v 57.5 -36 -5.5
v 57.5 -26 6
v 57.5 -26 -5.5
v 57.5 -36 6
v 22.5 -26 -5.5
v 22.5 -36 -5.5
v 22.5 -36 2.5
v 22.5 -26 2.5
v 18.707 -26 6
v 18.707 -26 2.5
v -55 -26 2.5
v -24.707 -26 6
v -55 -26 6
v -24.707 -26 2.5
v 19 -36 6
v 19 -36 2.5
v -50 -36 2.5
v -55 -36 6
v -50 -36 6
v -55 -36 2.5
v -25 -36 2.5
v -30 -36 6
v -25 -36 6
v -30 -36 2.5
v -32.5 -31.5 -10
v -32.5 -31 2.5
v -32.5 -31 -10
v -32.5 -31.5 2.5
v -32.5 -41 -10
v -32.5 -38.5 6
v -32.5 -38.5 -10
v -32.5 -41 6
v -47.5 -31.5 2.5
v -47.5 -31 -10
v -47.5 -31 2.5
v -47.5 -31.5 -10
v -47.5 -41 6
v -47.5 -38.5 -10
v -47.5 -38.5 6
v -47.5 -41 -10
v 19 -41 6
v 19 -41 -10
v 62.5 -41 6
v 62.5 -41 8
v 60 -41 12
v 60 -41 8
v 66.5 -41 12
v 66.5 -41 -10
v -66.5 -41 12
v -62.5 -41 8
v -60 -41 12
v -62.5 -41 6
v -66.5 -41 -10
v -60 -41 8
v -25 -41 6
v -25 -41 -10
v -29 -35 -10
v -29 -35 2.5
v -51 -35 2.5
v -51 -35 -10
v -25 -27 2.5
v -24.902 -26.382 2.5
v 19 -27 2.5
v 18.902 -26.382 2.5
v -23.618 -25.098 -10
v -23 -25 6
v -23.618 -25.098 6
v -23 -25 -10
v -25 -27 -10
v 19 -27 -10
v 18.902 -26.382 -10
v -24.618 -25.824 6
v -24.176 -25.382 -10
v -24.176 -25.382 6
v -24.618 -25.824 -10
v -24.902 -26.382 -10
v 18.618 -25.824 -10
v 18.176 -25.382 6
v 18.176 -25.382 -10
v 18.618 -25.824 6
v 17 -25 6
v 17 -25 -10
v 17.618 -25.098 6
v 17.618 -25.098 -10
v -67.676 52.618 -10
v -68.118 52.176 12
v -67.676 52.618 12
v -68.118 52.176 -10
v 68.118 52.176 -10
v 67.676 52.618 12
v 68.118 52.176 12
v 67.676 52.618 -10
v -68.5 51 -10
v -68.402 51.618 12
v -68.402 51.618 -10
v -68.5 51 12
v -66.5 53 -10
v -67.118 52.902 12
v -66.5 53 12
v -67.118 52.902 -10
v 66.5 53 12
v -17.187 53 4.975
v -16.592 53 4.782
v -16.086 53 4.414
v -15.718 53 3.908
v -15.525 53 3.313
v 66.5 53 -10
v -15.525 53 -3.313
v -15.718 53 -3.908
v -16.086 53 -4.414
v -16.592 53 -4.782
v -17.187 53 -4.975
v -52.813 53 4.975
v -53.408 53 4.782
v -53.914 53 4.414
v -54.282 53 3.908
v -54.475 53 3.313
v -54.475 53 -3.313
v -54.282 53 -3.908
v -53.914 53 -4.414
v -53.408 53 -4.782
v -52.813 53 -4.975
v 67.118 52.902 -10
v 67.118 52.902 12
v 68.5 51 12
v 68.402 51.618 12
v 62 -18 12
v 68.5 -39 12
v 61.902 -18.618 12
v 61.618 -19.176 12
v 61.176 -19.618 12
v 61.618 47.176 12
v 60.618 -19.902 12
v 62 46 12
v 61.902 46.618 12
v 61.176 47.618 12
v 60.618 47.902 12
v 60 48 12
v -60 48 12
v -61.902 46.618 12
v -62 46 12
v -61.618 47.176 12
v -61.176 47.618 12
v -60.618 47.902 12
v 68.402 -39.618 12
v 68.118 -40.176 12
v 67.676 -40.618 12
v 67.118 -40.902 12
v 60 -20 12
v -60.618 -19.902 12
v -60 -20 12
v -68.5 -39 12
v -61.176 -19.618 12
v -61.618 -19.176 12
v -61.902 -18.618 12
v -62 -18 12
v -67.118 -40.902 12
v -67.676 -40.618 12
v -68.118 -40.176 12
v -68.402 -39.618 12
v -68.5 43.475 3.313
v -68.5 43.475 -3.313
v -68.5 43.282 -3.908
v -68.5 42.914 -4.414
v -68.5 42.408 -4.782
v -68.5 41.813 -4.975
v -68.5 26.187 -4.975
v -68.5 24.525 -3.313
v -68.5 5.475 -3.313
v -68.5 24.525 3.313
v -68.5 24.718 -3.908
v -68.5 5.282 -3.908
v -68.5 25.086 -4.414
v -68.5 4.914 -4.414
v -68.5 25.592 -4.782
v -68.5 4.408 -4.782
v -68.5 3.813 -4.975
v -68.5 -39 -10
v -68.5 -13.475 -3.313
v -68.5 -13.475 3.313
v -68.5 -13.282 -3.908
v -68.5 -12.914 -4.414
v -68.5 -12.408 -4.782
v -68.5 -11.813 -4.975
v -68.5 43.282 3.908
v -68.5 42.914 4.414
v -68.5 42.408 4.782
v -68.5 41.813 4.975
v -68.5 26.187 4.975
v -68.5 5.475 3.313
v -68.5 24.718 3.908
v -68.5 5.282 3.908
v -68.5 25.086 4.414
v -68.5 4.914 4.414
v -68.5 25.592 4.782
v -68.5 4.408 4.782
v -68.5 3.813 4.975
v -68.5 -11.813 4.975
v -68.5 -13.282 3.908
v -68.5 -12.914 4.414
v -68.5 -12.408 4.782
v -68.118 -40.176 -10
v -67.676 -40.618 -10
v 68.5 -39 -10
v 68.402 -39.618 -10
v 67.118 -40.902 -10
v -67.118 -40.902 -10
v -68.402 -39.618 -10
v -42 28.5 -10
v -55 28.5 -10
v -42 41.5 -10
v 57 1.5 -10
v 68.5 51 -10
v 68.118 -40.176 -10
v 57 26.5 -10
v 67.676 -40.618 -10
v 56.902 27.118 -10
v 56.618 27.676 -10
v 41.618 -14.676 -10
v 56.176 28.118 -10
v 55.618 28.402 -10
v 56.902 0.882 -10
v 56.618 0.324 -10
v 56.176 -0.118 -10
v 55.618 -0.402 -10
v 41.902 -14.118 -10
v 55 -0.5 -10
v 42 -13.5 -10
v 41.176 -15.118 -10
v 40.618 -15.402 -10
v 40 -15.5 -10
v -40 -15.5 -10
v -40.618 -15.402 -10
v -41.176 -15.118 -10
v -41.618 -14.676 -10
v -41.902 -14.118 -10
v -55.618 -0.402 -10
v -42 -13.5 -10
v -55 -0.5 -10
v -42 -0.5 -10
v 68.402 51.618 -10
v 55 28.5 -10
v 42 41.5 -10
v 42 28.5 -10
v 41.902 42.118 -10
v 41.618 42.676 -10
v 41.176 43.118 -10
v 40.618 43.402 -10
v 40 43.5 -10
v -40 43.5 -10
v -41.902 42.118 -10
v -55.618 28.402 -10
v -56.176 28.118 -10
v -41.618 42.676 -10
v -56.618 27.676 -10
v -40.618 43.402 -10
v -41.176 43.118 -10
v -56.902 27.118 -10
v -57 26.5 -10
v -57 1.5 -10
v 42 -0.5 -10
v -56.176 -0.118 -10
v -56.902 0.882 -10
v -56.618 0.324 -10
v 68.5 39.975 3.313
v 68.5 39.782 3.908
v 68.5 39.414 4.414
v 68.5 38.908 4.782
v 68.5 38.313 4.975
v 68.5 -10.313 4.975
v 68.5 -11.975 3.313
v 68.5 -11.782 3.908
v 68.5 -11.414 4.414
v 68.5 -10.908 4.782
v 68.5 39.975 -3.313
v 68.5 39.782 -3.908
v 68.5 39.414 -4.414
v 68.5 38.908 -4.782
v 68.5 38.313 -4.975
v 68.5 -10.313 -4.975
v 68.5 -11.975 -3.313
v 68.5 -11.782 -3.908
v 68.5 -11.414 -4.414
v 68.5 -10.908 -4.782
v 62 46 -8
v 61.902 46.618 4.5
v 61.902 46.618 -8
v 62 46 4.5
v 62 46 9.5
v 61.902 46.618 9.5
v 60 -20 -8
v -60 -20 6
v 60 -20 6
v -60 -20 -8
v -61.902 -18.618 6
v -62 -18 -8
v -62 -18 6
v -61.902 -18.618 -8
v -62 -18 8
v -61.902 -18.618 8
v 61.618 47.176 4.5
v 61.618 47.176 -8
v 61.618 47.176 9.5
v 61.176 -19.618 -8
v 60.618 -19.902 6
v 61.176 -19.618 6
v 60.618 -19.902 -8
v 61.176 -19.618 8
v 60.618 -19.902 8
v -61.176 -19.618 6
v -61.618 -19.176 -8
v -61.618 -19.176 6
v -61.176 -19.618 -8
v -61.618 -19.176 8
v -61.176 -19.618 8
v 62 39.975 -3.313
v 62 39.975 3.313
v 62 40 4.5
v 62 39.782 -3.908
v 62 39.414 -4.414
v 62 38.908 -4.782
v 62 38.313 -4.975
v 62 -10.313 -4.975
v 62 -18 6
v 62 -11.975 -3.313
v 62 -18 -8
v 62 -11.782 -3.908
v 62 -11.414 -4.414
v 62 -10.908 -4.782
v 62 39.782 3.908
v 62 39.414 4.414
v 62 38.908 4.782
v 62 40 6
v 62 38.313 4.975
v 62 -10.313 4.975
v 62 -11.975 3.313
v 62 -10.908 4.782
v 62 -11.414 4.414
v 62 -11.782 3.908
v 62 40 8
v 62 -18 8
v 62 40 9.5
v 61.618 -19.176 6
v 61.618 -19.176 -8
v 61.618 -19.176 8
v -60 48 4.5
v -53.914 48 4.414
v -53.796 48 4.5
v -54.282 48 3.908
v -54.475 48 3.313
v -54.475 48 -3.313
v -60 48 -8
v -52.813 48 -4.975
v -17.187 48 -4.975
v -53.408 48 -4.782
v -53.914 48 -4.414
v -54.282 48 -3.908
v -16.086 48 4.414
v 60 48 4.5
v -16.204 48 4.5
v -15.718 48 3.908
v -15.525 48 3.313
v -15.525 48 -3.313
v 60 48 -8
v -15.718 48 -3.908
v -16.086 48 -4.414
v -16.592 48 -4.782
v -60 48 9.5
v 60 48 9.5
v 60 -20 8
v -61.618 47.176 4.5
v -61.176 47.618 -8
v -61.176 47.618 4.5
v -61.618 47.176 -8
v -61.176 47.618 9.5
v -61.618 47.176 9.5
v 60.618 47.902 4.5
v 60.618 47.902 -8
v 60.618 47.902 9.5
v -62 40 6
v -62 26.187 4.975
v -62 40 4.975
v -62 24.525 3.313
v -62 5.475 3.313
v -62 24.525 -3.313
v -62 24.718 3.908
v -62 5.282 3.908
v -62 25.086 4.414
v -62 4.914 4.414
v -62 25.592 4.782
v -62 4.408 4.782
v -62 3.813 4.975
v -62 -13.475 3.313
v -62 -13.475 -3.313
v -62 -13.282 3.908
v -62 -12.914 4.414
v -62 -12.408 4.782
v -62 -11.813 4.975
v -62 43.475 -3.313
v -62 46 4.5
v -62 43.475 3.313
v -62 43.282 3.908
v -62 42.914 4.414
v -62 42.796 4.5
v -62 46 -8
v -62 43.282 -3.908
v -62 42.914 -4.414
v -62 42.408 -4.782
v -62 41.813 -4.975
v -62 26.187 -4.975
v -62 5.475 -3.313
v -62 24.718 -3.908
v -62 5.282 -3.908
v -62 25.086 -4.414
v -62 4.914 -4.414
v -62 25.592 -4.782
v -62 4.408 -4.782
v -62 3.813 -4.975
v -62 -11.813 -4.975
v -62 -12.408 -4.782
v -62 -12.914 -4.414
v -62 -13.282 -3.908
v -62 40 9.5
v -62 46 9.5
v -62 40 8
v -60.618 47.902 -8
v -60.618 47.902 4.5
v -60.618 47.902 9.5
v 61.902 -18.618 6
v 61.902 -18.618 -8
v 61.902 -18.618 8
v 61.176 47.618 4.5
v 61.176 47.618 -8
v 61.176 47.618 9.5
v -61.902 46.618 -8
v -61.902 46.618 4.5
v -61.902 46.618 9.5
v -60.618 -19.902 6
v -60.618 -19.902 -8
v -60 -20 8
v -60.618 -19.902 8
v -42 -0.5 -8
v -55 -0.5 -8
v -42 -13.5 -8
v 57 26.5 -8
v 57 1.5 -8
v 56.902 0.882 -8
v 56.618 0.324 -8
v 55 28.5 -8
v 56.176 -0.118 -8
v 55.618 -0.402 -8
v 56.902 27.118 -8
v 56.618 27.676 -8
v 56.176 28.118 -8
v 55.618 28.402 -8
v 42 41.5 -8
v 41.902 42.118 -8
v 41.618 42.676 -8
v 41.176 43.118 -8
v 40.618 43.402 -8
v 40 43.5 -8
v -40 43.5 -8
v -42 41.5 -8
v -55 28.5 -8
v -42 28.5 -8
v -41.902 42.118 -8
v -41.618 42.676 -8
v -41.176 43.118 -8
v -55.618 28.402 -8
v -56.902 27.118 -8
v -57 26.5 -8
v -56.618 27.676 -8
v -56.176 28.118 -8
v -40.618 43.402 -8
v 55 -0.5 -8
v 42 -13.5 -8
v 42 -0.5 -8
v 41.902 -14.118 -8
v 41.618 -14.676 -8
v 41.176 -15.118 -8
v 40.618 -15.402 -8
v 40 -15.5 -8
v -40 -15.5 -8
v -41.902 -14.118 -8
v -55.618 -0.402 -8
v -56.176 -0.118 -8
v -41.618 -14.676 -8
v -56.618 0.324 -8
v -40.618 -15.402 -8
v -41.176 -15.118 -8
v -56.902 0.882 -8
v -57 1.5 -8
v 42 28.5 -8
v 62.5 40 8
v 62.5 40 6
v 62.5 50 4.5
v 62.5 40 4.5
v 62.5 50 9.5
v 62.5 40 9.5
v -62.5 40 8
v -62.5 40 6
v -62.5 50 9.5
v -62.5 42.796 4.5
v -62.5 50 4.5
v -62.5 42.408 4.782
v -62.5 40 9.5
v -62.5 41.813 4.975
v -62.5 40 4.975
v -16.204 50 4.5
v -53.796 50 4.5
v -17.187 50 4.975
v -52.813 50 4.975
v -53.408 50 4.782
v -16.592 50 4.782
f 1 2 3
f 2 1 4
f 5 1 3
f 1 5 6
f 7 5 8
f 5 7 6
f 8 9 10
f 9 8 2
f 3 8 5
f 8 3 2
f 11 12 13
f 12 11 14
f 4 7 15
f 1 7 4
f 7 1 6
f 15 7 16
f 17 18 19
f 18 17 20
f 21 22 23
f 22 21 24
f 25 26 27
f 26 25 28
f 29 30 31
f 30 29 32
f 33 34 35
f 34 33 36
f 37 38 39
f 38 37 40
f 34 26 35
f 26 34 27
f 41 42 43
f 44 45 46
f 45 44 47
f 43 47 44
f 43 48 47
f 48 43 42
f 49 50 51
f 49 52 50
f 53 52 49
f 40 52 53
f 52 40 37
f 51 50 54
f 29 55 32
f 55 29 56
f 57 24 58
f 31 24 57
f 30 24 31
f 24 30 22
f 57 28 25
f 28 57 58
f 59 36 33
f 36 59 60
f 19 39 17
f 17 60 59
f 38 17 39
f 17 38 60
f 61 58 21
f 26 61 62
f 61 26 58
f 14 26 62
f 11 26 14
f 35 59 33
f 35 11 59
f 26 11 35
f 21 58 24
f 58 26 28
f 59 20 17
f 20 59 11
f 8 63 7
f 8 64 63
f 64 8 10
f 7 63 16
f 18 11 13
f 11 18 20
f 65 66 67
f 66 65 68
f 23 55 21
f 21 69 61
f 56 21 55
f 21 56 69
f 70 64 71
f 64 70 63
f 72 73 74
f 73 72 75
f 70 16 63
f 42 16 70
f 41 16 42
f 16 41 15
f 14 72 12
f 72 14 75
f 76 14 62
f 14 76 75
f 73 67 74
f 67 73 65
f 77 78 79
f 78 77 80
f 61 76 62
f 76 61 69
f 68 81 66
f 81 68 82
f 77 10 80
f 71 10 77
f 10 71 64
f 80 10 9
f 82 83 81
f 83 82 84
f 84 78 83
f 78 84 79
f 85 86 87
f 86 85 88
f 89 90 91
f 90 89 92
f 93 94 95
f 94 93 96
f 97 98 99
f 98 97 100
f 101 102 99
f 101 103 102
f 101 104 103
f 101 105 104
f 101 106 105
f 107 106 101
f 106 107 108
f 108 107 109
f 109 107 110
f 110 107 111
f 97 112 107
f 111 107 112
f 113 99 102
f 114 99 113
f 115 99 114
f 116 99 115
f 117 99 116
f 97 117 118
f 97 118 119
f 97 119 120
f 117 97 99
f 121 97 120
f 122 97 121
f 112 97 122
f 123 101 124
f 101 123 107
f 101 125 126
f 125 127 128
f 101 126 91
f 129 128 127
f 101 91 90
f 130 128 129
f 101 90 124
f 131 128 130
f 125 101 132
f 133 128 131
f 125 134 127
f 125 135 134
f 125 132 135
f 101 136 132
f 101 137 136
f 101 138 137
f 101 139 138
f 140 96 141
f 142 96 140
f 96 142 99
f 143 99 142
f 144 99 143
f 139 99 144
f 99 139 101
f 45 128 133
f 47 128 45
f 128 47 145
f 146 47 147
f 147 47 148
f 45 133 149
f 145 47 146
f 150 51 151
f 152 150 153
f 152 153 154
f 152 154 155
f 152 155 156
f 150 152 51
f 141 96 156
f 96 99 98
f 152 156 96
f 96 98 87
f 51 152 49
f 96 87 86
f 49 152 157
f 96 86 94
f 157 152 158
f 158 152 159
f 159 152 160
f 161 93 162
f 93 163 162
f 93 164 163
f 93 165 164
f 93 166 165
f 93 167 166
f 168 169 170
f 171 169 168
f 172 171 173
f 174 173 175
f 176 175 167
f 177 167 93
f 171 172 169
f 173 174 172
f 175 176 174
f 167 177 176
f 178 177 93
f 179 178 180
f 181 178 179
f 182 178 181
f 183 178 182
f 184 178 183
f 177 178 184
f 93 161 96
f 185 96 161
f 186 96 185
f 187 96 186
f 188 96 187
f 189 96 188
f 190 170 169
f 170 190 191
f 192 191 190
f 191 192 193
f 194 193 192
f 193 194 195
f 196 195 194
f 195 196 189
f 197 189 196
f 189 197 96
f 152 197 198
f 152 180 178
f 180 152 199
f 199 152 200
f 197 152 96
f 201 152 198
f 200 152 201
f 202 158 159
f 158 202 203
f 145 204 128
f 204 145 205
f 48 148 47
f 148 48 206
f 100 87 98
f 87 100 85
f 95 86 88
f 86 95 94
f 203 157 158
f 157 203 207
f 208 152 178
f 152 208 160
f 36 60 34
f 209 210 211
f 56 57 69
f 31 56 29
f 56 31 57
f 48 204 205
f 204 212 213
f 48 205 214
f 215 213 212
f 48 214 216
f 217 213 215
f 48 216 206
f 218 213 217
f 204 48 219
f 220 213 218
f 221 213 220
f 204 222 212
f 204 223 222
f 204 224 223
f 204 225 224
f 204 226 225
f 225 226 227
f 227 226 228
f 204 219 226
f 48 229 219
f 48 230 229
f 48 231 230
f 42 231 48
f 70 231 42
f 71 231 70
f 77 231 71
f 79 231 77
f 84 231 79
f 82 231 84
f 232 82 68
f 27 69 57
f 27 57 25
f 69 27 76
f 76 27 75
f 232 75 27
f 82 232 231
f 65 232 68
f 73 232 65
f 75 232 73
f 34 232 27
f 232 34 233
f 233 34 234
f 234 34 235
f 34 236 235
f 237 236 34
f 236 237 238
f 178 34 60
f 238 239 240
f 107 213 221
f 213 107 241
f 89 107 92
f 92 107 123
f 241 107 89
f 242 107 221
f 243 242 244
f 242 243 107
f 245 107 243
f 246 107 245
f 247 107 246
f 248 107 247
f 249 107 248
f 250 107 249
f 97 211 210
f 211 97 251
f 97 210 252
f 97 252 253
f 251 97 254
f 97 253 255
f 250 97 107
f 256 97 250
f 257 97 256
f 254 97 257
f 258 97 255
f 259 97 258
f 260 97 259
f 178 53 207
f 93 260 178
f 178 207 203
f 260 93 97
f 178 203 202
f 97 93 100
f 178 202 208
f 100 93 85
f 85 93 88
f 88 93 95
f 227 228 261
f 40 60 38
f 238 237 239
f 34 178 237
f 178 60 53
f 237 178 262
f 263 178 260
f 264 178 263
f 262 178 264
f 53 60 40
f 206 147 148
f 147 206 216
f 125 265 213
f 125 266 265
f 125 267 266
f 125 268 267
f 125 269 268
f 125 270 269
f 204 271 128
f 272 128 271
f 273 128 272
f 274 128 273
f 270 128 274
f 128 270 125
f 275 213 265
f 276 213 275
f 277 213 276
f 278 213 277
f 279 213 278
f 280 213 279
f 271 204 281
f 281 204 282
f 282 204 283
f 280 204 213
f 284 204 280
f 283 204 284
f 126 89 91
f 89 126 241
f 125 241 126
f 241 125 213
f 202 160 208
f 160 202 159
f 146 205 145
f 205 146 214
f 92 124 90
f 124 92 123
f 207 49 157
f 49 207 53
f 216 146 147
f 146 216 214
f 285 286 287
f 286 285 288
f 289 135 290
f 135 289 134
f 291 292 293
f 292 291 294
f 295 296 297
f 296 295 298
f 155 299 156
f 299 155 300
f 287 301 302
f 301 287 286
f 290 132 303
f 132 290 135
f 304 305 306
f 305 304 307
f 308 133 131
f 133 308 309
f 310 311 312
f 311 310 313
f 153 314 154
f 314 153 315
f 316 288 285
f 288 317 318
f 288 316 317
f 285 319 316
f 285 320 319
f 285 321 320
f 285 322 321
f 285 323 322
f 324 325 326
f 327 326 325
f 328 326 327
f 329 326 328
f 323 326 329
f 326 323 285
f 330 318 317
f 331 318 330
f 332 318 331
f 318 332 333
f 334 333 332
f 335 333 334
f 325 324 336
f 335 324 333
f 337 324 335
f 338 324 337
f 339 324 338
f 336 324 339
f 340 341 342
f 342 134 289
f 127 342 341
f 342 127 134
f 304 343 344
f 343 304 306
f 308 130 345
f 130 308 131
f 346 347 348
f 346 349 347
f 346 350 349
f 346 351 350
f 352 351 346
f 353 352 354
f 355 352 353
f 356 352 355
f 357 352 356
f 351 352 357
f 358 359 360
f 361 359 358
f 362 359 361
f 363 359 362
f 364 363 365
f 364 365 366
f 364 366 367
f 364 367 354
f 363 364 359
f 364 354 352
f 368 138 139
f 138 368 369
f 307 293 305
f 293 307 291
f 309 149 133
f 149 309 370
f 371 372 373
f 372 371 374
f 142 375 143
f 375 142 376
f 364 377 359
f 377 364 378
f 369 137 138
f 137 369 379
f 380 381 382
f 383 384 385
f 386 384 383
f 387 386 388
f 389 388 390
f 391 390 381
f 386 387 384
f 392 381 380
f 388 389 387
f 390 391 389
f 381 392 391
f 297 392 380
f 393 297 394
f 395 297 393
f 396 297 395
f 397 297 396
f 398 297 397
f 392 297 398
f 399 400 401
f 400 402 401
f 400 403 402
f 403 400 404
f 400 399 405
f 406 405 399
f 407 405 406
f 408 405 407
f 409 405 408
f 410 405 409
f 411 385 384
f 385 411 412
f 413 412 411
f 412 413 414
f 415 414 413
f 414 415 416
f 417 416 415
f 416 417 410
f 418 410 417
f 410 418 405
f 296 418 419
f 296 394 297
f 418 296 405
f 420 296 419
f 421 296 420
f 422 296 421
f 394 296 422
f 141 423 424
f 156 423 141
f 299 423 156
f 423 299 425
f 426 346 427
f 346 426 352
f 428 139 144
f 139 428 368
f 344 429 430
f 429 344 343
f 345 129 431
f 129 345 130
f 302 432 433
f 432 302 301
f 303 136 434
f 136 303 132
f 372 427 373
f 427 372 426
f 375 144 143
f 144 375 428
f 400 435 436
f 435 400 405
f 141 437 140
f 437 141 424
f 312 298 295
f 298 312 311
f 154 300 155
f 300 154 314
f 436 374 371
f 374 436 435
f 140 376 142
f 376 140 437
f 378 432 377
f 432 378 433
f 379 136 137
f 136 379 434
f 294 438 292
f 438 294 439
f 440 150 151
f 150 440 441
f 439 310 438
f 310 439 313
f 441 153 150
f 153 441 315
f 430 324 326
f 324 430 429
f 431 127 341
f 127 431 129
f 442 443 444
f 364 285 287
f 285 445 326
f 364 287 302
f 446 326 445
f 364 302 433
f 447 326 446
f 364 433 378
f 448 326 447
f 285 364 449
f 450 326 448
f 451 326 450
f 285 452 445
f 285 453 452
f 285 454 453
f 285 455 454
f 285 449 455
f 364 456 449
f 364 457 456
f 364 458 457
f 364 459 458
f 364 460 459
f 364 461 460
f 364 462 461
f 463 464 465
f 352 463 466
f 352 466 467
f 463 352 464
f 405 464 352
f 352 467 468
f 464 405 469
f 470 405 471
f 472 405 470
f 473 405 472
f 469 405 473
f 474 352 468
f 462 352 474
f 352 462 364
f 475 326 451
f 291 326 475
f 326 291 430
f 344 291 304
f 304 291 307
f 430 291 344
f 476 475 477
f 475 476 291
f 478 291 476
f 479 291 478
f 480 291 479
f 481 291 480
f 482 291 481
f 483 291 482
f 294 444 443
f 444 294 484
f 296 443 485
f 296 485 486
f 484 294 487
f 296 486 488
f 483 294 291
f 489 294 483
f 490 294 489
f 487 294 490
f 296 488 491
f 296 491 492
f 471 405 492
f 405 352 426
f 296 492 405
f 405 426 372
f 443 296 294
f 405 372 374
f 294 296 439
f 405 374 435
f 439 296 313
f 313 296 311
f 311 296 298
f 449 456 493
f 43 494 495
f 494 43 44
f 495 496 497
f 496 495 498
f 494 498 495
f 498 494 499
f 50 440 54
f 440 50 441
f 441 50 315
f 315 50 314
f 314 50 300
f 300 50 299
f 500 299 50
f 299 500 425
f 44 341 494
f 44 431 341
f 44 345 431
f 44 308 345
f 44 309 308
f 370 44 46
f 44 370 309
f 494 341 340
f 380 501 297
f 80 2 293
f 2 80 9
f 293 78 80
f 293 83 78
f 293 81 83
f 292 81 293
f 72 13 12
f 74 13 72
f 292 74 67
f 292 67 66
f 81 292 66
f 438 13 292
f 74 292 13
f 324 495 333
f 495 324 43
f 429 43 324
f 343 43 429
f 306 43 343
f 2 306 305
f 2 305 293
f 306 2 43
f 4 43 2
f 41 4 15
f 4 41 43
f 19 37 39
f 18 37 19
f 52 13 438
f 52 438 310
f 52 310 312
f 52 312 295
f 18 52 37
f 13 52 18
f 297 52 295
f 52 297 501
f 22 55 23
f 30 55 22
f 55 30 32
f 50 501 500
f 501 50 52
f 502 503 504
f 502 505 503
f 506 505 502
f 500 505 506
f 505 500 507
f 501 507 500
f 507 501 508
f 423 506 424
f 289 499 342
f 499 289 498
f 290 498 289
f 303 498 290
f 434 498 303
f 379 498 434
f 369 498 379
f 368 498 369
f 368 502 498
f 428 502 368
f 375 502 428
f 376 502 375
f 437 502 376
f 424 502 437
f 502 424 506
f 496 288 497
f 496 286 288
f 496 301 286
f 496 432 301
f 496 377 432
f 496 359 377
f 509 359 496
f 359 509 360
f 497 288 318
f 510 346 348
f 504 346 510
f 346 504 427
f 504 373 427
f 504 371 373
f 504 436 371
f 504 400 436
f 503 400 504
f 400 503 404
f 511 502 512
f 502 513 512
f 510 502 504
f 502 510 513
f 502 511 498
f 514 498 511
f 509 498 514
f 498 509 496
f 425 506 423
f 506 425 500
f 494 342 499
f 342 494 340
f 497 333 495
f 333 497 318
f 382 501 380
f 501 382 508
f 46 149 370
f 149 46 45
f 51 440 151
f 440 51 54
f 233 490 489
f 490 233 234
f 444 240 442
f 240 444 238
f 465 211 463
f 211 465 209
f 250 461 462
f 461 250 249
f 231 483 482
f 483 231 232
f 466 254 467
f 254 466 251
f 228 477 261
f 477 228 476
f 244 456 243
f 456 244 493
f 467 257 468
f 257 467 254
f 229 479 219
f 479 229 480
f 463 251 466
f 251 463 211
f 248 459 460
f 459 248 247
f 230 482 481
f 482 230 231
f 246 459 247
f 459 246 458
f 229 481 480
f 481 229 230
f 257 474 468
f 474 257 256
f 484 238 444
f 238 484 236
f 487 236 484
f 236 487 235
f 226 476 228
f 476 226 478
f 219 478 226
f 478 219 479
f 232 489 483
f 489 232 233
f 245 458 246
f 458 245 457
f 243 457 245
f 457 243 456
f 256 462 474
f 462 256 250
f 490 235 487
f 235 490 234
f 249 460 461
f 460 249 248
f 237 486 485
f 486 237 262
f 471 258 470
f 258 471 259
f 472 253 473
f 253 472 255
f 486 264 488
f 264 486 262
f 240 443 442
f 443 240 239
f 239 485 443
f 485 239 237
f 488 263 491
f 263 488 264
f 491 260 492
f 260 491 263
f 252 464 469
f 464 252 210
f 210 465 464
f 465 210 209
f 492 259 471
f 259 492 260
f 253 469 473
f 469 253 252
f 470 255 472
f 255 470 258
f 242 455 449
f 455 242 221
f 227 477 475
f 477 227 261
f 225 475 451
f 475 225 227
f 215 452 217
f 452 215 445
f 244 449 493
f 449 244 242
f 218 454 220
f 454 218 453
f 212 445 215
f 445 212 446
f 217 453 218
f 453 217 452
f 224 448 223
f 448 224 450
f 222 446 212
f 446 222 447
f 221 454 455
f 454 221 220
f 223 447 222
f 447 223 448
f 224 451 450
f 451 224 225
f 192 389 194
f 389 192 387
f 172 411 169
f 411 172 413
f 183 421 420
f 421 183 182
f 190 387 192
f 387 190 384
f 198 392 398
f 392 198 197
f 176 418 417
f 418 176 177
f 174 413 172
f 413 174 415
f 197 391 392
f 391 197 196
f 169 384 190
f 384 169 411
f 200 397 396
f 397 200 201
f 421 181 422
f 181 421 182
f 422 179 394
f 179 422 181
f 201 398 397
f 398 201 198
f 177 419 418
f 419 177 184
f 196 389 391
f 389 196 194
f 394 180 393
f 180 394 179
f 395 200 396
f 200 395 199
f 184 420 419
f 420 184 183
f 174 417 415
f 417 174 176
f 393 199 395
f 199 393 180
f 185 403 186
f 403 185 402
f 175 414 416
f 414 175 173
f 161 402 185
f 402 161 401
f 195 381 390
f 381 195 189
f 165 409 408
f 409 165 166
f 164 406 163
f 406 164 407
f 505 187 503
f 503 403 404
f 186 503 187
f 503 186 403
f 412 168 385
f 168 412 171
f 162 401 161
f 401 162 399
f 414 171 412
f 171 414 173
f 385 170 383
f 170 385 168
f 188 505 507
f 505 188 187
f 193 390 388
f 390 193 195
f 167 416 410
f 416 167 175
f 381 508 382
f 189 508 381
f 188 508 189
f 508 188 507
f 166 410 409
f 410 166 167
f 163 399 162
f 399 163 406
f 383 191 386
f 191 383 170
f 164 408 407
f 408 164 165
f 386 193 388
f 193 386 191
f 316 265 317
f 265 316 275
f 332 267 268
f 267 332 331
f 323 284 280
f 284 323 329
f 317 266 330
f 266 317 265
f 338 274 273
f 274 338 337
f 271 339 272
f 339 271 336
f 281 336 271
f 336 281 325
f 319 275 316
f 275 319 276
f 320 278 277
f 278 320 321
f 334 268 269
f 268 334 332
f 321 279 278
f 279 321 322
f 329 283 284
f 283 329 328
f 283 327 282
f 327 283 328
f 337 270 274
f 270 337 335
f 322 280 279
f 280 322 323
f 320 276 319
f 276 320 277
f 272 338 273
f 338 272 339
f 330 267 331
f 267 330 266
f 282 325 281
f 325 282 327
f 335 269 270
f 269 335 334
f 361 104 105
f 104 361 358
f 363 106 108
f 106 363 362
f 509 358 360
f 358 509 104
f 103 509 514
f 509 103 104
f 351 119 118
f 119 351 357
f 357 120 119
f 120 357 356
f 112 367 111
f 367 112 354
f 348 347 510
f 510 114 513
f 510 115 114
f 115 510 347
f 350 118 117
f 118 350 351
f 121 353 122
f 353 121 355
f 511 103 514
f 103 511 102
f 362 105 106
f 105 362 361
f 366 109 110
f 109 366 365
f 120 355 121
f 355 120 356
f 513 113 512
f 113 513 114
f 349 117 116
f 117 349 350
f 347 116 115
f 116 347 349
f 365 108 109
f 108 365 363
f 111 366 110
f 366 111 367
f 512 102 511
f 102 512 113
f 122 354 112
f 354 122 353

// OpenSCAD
$fn=20;
//iphone4 case
icase();

// can't be larger than 152.4mm
icaseX = 133;
icaseY = 90;
icaseZ = 20;
icaseShiftX = 0;
icaseShiftY = 6;
icaseShiftZ = 0;

// the Z is heighter on purpose.
// Play with ShiftZ, not Z.
iphoneX = 120;
iphoneY = 64;
iphoneZ = 50;
iphoneShiftX = 0;
iphoneShiftY = 14;
iphoneShiftZ = 17;

// the plate track cut.
plateX = 125;
plateY = 200;
plateZ = 2;
plateShiftX = 0;
plateShiftY = -51;
plateShiftZ = 7;
platetopShiftX = 0;
platetopShiftY = -50;
platetopShiftZ = 33;


// to help the plate seed at the bottom of the track.
sPlateX = 125;
sPlateY = 10;
sPlateZ = 5;
sPlateXshift = 0;
sPlateYshift = 45;
sPlateZshift = 7;


// the Screen Hole.
// The X and Y are actually backwards.
screenX = 80;
screenY = 55;
screenZ = 152;
screenShiftX = 0;
screenShiftY = 14;
screenShiftZ = -5;

// the front camera Hole.
// The X and Y are actually backwards.
fcX = 20;
fcY = 25;
fcZ = 152;
fcShiftX = -45;
fcShiftY = 14;
fcShiftZ = -5;

// the front button Hole.
// The X and Y are actually backwards.
fbX = 20;
fbY = 25;
fbZ = 152;
fbShiftX = 45;
fbShiftY = 14;
fbShiftZ = -5;

// Power button
// The X and Y are actually backwards.
pbX = 30;
pbY = 15;
pbZ = 6;
pbShiftX = -65;
pbShiftY = -4;
pbShiftZ = 0;

// Headphone Jack
// The X and Y are actually backwards.
hjX = 30;
hjY = 15;
hjZ = 6;
hjShiftX = -65;
hjShiftY = 34;
hjShiftZ = 0;

// Speaker Hole with usb Iphone cable
// The X and Y are actually backwards.
sX = 30;
sY = 48;
sZ = 6;
sShiftX = 65;
sShiftY = 14;
sShiftZ = 0;

// Volume Controls
// The X and Y are actually backwards.
vX = 35;
vY = 30;
vZ = 6;
vShiftX = -35;
vShiftY = 50;
vShiftZ = 0;

//////////////////////////////////////////////////
//// Rail System Variables Passed this Point. ////
//////////////////////////////////////////////////

gRailx = 0;
gRaily = 13;
gRailz = 0;

// This is a spring hole for the rail button.
bspringX = 35;
bspringY = 10;
bspringZ = 15;
bspringXShift = 40;
bspringYShift = -44;
bspringZShift = 2;

// Rail first pass.
railx = 15;
raily = 10;
railz = 60;
railxShift = -40;
railyShift = -49;
railzShift = 0;

// Rail second pass, one triangle.
ltp = 5;
lth = 40;
ltxShift = -29;
ltyShift = -48;
ltzShift = 0;

// Rail third pass, second triangle.
rtp = 5;
rth = 40;
rtxShift = -51;
rtyShift = -48;
rtzShift = 0;

// path for rail button
prbx = 100;
prby = 10;
prbz = 15;
prbxShift = -5;
prbyShift = -44;
prbzShift = 10;

// Negative space for your finger to push the button.
nbsx = 40;
nbsy = 20;
nbsz = 60;
nbsxShift = -3;
nbsyShift = -50;
nbszShift = 0;

module icase()
{
// This is where you Copy and Paste if you need to see invisible space.





	difference()
	{
		// Making our brick that we start off with.
		translate([icaseShiftX, icaseShiftY, icaseShiftZ])
		minkowski() {
  		cube([icaseX,icaseY,icaseZ], center=true);
    cylinder(r=2,h=2);
		}

		// Making the Iphone bed.
		translate([iphoneShiftX, iphoneShiftY, iphoneShiftZ])
		minkowski() {
    cube([iphoneX,iphoneY,iphoneZ], center = true);
    cylinder(r=2,h=2);
		}

		//Cutting the Plate grove.
		translate([plateShiftX,plateShiftY,plateShiftZ])
		cube([plateX,plateY,plateZ], center = true);

		//Cutting the Plate grove Seed.
		translate([sPlateXshift,sPlateYshift,sPlateZshift])
		cube([sPlateX,sPlateY,sPlateZ], center = true);

		// trimming plate surface. for the rail attach
		translate([platetopShiftX,platetopShiftY,platetopShiftZ])
    cube([iphoneX,iphoneY,iphoneZ], center = true);

		// cutting the screen hole.
		translate([screenShiftX,screenShiftY,screenShiftZ])
		minkowski() {
    cube([screenX,screenY,screenZ], center = true);
    cylinder(r=2,h=2);
		}

		// cutting the front camera hole.
		translate([fcShiftX,fcShiftY,fcShiftZ])
		minkowski() {
    cube([fcX,fcY,fcZ], center = true);
    cylinder(r=2,h=2);
		}

		// cutting the front button hole.
		translate([fbShiftX,fbShiftY,fbShiftZ])
		minkowski() {
    cube([fbX,fbY,fbZ], center = true);
    cylinder(r=2,h=2);
		}

		// cutting the power button hole.
		translate([pbShiftX,pbShiftY,pbShiftZ])
		minkowski() {
    cube([pbX,pbY,pbZ], center = true);
  		sphere(2);
		}

		// cutting the power button hole.
		translate([hjShiftX,hjShiftY,hjShiftZ])
		minkowski() {
    cube([hjX,hjY,hjZ], center = true);
  		sphere(2);
		}

		// cutting the speaker hole.
		translate([sShiftX,sShiftY,sShiftZ])
		minkowski() {
    cube([sX,sY,sZ], center = true);
  		sphere(2);
		}

		// cutting the volume hole.
		translate([vShiftX,vShiftY,vShiftZ])
		minkowski() {
    cube([vX,vY,vZ], center = true);
  		sphere(2);
		}


		/////////////////////////////////////////////
		//// Rail System Code Passed this Point. ////
		/////////////////////////////////////////////
		translate([gRailx, gRaily, gRailz])
		union()
		{
			// This the rail button spring box.
			translate([bspringXShift, bspringYShift, bspringZShift])
  			cube([bspringX,bspringY,bspringZ], center=true);

			// This is the rail first Pass.
			translate([railxShift, railyShift, railzShift])
  			cube([railx,raily,railz], center=true);

			// Left Triangle
			translate([ltxShift,ltyShift,ltzShift])
			rotate(a=[0,180,45])
			linear_extrude(height = lth, center = true, convexity = 10, twist = 0)
			polygon(points=[[0,0],[ltp,0],[0,ltp]], paths=[[0,1,2]]);

			// Right Triangle
			translate([rtxShift,rtyShift,rtzShift])
			rotate(a=[0,180,225])
			linear_extrude(height = rth, center = true, convexity = 10, twist = 0)
			polygon(points=[[0,0],[rtp,0],[0,rtp]], paths=[[0,1,2]]);

			// path for rail button.
			translate([prbxShift, prbyShift, prbzShift])
	    cube([prbx,prby,prbz], center = true);

			// Negative space for our hand.
			translate([nbsxShift, nbsyShift, nbszShift])
			minkowski() {
			cube([nbsx,nbsy,nbsz], center = true);
			cylinder(r=2,h=2);
		}
		}
	}
}
